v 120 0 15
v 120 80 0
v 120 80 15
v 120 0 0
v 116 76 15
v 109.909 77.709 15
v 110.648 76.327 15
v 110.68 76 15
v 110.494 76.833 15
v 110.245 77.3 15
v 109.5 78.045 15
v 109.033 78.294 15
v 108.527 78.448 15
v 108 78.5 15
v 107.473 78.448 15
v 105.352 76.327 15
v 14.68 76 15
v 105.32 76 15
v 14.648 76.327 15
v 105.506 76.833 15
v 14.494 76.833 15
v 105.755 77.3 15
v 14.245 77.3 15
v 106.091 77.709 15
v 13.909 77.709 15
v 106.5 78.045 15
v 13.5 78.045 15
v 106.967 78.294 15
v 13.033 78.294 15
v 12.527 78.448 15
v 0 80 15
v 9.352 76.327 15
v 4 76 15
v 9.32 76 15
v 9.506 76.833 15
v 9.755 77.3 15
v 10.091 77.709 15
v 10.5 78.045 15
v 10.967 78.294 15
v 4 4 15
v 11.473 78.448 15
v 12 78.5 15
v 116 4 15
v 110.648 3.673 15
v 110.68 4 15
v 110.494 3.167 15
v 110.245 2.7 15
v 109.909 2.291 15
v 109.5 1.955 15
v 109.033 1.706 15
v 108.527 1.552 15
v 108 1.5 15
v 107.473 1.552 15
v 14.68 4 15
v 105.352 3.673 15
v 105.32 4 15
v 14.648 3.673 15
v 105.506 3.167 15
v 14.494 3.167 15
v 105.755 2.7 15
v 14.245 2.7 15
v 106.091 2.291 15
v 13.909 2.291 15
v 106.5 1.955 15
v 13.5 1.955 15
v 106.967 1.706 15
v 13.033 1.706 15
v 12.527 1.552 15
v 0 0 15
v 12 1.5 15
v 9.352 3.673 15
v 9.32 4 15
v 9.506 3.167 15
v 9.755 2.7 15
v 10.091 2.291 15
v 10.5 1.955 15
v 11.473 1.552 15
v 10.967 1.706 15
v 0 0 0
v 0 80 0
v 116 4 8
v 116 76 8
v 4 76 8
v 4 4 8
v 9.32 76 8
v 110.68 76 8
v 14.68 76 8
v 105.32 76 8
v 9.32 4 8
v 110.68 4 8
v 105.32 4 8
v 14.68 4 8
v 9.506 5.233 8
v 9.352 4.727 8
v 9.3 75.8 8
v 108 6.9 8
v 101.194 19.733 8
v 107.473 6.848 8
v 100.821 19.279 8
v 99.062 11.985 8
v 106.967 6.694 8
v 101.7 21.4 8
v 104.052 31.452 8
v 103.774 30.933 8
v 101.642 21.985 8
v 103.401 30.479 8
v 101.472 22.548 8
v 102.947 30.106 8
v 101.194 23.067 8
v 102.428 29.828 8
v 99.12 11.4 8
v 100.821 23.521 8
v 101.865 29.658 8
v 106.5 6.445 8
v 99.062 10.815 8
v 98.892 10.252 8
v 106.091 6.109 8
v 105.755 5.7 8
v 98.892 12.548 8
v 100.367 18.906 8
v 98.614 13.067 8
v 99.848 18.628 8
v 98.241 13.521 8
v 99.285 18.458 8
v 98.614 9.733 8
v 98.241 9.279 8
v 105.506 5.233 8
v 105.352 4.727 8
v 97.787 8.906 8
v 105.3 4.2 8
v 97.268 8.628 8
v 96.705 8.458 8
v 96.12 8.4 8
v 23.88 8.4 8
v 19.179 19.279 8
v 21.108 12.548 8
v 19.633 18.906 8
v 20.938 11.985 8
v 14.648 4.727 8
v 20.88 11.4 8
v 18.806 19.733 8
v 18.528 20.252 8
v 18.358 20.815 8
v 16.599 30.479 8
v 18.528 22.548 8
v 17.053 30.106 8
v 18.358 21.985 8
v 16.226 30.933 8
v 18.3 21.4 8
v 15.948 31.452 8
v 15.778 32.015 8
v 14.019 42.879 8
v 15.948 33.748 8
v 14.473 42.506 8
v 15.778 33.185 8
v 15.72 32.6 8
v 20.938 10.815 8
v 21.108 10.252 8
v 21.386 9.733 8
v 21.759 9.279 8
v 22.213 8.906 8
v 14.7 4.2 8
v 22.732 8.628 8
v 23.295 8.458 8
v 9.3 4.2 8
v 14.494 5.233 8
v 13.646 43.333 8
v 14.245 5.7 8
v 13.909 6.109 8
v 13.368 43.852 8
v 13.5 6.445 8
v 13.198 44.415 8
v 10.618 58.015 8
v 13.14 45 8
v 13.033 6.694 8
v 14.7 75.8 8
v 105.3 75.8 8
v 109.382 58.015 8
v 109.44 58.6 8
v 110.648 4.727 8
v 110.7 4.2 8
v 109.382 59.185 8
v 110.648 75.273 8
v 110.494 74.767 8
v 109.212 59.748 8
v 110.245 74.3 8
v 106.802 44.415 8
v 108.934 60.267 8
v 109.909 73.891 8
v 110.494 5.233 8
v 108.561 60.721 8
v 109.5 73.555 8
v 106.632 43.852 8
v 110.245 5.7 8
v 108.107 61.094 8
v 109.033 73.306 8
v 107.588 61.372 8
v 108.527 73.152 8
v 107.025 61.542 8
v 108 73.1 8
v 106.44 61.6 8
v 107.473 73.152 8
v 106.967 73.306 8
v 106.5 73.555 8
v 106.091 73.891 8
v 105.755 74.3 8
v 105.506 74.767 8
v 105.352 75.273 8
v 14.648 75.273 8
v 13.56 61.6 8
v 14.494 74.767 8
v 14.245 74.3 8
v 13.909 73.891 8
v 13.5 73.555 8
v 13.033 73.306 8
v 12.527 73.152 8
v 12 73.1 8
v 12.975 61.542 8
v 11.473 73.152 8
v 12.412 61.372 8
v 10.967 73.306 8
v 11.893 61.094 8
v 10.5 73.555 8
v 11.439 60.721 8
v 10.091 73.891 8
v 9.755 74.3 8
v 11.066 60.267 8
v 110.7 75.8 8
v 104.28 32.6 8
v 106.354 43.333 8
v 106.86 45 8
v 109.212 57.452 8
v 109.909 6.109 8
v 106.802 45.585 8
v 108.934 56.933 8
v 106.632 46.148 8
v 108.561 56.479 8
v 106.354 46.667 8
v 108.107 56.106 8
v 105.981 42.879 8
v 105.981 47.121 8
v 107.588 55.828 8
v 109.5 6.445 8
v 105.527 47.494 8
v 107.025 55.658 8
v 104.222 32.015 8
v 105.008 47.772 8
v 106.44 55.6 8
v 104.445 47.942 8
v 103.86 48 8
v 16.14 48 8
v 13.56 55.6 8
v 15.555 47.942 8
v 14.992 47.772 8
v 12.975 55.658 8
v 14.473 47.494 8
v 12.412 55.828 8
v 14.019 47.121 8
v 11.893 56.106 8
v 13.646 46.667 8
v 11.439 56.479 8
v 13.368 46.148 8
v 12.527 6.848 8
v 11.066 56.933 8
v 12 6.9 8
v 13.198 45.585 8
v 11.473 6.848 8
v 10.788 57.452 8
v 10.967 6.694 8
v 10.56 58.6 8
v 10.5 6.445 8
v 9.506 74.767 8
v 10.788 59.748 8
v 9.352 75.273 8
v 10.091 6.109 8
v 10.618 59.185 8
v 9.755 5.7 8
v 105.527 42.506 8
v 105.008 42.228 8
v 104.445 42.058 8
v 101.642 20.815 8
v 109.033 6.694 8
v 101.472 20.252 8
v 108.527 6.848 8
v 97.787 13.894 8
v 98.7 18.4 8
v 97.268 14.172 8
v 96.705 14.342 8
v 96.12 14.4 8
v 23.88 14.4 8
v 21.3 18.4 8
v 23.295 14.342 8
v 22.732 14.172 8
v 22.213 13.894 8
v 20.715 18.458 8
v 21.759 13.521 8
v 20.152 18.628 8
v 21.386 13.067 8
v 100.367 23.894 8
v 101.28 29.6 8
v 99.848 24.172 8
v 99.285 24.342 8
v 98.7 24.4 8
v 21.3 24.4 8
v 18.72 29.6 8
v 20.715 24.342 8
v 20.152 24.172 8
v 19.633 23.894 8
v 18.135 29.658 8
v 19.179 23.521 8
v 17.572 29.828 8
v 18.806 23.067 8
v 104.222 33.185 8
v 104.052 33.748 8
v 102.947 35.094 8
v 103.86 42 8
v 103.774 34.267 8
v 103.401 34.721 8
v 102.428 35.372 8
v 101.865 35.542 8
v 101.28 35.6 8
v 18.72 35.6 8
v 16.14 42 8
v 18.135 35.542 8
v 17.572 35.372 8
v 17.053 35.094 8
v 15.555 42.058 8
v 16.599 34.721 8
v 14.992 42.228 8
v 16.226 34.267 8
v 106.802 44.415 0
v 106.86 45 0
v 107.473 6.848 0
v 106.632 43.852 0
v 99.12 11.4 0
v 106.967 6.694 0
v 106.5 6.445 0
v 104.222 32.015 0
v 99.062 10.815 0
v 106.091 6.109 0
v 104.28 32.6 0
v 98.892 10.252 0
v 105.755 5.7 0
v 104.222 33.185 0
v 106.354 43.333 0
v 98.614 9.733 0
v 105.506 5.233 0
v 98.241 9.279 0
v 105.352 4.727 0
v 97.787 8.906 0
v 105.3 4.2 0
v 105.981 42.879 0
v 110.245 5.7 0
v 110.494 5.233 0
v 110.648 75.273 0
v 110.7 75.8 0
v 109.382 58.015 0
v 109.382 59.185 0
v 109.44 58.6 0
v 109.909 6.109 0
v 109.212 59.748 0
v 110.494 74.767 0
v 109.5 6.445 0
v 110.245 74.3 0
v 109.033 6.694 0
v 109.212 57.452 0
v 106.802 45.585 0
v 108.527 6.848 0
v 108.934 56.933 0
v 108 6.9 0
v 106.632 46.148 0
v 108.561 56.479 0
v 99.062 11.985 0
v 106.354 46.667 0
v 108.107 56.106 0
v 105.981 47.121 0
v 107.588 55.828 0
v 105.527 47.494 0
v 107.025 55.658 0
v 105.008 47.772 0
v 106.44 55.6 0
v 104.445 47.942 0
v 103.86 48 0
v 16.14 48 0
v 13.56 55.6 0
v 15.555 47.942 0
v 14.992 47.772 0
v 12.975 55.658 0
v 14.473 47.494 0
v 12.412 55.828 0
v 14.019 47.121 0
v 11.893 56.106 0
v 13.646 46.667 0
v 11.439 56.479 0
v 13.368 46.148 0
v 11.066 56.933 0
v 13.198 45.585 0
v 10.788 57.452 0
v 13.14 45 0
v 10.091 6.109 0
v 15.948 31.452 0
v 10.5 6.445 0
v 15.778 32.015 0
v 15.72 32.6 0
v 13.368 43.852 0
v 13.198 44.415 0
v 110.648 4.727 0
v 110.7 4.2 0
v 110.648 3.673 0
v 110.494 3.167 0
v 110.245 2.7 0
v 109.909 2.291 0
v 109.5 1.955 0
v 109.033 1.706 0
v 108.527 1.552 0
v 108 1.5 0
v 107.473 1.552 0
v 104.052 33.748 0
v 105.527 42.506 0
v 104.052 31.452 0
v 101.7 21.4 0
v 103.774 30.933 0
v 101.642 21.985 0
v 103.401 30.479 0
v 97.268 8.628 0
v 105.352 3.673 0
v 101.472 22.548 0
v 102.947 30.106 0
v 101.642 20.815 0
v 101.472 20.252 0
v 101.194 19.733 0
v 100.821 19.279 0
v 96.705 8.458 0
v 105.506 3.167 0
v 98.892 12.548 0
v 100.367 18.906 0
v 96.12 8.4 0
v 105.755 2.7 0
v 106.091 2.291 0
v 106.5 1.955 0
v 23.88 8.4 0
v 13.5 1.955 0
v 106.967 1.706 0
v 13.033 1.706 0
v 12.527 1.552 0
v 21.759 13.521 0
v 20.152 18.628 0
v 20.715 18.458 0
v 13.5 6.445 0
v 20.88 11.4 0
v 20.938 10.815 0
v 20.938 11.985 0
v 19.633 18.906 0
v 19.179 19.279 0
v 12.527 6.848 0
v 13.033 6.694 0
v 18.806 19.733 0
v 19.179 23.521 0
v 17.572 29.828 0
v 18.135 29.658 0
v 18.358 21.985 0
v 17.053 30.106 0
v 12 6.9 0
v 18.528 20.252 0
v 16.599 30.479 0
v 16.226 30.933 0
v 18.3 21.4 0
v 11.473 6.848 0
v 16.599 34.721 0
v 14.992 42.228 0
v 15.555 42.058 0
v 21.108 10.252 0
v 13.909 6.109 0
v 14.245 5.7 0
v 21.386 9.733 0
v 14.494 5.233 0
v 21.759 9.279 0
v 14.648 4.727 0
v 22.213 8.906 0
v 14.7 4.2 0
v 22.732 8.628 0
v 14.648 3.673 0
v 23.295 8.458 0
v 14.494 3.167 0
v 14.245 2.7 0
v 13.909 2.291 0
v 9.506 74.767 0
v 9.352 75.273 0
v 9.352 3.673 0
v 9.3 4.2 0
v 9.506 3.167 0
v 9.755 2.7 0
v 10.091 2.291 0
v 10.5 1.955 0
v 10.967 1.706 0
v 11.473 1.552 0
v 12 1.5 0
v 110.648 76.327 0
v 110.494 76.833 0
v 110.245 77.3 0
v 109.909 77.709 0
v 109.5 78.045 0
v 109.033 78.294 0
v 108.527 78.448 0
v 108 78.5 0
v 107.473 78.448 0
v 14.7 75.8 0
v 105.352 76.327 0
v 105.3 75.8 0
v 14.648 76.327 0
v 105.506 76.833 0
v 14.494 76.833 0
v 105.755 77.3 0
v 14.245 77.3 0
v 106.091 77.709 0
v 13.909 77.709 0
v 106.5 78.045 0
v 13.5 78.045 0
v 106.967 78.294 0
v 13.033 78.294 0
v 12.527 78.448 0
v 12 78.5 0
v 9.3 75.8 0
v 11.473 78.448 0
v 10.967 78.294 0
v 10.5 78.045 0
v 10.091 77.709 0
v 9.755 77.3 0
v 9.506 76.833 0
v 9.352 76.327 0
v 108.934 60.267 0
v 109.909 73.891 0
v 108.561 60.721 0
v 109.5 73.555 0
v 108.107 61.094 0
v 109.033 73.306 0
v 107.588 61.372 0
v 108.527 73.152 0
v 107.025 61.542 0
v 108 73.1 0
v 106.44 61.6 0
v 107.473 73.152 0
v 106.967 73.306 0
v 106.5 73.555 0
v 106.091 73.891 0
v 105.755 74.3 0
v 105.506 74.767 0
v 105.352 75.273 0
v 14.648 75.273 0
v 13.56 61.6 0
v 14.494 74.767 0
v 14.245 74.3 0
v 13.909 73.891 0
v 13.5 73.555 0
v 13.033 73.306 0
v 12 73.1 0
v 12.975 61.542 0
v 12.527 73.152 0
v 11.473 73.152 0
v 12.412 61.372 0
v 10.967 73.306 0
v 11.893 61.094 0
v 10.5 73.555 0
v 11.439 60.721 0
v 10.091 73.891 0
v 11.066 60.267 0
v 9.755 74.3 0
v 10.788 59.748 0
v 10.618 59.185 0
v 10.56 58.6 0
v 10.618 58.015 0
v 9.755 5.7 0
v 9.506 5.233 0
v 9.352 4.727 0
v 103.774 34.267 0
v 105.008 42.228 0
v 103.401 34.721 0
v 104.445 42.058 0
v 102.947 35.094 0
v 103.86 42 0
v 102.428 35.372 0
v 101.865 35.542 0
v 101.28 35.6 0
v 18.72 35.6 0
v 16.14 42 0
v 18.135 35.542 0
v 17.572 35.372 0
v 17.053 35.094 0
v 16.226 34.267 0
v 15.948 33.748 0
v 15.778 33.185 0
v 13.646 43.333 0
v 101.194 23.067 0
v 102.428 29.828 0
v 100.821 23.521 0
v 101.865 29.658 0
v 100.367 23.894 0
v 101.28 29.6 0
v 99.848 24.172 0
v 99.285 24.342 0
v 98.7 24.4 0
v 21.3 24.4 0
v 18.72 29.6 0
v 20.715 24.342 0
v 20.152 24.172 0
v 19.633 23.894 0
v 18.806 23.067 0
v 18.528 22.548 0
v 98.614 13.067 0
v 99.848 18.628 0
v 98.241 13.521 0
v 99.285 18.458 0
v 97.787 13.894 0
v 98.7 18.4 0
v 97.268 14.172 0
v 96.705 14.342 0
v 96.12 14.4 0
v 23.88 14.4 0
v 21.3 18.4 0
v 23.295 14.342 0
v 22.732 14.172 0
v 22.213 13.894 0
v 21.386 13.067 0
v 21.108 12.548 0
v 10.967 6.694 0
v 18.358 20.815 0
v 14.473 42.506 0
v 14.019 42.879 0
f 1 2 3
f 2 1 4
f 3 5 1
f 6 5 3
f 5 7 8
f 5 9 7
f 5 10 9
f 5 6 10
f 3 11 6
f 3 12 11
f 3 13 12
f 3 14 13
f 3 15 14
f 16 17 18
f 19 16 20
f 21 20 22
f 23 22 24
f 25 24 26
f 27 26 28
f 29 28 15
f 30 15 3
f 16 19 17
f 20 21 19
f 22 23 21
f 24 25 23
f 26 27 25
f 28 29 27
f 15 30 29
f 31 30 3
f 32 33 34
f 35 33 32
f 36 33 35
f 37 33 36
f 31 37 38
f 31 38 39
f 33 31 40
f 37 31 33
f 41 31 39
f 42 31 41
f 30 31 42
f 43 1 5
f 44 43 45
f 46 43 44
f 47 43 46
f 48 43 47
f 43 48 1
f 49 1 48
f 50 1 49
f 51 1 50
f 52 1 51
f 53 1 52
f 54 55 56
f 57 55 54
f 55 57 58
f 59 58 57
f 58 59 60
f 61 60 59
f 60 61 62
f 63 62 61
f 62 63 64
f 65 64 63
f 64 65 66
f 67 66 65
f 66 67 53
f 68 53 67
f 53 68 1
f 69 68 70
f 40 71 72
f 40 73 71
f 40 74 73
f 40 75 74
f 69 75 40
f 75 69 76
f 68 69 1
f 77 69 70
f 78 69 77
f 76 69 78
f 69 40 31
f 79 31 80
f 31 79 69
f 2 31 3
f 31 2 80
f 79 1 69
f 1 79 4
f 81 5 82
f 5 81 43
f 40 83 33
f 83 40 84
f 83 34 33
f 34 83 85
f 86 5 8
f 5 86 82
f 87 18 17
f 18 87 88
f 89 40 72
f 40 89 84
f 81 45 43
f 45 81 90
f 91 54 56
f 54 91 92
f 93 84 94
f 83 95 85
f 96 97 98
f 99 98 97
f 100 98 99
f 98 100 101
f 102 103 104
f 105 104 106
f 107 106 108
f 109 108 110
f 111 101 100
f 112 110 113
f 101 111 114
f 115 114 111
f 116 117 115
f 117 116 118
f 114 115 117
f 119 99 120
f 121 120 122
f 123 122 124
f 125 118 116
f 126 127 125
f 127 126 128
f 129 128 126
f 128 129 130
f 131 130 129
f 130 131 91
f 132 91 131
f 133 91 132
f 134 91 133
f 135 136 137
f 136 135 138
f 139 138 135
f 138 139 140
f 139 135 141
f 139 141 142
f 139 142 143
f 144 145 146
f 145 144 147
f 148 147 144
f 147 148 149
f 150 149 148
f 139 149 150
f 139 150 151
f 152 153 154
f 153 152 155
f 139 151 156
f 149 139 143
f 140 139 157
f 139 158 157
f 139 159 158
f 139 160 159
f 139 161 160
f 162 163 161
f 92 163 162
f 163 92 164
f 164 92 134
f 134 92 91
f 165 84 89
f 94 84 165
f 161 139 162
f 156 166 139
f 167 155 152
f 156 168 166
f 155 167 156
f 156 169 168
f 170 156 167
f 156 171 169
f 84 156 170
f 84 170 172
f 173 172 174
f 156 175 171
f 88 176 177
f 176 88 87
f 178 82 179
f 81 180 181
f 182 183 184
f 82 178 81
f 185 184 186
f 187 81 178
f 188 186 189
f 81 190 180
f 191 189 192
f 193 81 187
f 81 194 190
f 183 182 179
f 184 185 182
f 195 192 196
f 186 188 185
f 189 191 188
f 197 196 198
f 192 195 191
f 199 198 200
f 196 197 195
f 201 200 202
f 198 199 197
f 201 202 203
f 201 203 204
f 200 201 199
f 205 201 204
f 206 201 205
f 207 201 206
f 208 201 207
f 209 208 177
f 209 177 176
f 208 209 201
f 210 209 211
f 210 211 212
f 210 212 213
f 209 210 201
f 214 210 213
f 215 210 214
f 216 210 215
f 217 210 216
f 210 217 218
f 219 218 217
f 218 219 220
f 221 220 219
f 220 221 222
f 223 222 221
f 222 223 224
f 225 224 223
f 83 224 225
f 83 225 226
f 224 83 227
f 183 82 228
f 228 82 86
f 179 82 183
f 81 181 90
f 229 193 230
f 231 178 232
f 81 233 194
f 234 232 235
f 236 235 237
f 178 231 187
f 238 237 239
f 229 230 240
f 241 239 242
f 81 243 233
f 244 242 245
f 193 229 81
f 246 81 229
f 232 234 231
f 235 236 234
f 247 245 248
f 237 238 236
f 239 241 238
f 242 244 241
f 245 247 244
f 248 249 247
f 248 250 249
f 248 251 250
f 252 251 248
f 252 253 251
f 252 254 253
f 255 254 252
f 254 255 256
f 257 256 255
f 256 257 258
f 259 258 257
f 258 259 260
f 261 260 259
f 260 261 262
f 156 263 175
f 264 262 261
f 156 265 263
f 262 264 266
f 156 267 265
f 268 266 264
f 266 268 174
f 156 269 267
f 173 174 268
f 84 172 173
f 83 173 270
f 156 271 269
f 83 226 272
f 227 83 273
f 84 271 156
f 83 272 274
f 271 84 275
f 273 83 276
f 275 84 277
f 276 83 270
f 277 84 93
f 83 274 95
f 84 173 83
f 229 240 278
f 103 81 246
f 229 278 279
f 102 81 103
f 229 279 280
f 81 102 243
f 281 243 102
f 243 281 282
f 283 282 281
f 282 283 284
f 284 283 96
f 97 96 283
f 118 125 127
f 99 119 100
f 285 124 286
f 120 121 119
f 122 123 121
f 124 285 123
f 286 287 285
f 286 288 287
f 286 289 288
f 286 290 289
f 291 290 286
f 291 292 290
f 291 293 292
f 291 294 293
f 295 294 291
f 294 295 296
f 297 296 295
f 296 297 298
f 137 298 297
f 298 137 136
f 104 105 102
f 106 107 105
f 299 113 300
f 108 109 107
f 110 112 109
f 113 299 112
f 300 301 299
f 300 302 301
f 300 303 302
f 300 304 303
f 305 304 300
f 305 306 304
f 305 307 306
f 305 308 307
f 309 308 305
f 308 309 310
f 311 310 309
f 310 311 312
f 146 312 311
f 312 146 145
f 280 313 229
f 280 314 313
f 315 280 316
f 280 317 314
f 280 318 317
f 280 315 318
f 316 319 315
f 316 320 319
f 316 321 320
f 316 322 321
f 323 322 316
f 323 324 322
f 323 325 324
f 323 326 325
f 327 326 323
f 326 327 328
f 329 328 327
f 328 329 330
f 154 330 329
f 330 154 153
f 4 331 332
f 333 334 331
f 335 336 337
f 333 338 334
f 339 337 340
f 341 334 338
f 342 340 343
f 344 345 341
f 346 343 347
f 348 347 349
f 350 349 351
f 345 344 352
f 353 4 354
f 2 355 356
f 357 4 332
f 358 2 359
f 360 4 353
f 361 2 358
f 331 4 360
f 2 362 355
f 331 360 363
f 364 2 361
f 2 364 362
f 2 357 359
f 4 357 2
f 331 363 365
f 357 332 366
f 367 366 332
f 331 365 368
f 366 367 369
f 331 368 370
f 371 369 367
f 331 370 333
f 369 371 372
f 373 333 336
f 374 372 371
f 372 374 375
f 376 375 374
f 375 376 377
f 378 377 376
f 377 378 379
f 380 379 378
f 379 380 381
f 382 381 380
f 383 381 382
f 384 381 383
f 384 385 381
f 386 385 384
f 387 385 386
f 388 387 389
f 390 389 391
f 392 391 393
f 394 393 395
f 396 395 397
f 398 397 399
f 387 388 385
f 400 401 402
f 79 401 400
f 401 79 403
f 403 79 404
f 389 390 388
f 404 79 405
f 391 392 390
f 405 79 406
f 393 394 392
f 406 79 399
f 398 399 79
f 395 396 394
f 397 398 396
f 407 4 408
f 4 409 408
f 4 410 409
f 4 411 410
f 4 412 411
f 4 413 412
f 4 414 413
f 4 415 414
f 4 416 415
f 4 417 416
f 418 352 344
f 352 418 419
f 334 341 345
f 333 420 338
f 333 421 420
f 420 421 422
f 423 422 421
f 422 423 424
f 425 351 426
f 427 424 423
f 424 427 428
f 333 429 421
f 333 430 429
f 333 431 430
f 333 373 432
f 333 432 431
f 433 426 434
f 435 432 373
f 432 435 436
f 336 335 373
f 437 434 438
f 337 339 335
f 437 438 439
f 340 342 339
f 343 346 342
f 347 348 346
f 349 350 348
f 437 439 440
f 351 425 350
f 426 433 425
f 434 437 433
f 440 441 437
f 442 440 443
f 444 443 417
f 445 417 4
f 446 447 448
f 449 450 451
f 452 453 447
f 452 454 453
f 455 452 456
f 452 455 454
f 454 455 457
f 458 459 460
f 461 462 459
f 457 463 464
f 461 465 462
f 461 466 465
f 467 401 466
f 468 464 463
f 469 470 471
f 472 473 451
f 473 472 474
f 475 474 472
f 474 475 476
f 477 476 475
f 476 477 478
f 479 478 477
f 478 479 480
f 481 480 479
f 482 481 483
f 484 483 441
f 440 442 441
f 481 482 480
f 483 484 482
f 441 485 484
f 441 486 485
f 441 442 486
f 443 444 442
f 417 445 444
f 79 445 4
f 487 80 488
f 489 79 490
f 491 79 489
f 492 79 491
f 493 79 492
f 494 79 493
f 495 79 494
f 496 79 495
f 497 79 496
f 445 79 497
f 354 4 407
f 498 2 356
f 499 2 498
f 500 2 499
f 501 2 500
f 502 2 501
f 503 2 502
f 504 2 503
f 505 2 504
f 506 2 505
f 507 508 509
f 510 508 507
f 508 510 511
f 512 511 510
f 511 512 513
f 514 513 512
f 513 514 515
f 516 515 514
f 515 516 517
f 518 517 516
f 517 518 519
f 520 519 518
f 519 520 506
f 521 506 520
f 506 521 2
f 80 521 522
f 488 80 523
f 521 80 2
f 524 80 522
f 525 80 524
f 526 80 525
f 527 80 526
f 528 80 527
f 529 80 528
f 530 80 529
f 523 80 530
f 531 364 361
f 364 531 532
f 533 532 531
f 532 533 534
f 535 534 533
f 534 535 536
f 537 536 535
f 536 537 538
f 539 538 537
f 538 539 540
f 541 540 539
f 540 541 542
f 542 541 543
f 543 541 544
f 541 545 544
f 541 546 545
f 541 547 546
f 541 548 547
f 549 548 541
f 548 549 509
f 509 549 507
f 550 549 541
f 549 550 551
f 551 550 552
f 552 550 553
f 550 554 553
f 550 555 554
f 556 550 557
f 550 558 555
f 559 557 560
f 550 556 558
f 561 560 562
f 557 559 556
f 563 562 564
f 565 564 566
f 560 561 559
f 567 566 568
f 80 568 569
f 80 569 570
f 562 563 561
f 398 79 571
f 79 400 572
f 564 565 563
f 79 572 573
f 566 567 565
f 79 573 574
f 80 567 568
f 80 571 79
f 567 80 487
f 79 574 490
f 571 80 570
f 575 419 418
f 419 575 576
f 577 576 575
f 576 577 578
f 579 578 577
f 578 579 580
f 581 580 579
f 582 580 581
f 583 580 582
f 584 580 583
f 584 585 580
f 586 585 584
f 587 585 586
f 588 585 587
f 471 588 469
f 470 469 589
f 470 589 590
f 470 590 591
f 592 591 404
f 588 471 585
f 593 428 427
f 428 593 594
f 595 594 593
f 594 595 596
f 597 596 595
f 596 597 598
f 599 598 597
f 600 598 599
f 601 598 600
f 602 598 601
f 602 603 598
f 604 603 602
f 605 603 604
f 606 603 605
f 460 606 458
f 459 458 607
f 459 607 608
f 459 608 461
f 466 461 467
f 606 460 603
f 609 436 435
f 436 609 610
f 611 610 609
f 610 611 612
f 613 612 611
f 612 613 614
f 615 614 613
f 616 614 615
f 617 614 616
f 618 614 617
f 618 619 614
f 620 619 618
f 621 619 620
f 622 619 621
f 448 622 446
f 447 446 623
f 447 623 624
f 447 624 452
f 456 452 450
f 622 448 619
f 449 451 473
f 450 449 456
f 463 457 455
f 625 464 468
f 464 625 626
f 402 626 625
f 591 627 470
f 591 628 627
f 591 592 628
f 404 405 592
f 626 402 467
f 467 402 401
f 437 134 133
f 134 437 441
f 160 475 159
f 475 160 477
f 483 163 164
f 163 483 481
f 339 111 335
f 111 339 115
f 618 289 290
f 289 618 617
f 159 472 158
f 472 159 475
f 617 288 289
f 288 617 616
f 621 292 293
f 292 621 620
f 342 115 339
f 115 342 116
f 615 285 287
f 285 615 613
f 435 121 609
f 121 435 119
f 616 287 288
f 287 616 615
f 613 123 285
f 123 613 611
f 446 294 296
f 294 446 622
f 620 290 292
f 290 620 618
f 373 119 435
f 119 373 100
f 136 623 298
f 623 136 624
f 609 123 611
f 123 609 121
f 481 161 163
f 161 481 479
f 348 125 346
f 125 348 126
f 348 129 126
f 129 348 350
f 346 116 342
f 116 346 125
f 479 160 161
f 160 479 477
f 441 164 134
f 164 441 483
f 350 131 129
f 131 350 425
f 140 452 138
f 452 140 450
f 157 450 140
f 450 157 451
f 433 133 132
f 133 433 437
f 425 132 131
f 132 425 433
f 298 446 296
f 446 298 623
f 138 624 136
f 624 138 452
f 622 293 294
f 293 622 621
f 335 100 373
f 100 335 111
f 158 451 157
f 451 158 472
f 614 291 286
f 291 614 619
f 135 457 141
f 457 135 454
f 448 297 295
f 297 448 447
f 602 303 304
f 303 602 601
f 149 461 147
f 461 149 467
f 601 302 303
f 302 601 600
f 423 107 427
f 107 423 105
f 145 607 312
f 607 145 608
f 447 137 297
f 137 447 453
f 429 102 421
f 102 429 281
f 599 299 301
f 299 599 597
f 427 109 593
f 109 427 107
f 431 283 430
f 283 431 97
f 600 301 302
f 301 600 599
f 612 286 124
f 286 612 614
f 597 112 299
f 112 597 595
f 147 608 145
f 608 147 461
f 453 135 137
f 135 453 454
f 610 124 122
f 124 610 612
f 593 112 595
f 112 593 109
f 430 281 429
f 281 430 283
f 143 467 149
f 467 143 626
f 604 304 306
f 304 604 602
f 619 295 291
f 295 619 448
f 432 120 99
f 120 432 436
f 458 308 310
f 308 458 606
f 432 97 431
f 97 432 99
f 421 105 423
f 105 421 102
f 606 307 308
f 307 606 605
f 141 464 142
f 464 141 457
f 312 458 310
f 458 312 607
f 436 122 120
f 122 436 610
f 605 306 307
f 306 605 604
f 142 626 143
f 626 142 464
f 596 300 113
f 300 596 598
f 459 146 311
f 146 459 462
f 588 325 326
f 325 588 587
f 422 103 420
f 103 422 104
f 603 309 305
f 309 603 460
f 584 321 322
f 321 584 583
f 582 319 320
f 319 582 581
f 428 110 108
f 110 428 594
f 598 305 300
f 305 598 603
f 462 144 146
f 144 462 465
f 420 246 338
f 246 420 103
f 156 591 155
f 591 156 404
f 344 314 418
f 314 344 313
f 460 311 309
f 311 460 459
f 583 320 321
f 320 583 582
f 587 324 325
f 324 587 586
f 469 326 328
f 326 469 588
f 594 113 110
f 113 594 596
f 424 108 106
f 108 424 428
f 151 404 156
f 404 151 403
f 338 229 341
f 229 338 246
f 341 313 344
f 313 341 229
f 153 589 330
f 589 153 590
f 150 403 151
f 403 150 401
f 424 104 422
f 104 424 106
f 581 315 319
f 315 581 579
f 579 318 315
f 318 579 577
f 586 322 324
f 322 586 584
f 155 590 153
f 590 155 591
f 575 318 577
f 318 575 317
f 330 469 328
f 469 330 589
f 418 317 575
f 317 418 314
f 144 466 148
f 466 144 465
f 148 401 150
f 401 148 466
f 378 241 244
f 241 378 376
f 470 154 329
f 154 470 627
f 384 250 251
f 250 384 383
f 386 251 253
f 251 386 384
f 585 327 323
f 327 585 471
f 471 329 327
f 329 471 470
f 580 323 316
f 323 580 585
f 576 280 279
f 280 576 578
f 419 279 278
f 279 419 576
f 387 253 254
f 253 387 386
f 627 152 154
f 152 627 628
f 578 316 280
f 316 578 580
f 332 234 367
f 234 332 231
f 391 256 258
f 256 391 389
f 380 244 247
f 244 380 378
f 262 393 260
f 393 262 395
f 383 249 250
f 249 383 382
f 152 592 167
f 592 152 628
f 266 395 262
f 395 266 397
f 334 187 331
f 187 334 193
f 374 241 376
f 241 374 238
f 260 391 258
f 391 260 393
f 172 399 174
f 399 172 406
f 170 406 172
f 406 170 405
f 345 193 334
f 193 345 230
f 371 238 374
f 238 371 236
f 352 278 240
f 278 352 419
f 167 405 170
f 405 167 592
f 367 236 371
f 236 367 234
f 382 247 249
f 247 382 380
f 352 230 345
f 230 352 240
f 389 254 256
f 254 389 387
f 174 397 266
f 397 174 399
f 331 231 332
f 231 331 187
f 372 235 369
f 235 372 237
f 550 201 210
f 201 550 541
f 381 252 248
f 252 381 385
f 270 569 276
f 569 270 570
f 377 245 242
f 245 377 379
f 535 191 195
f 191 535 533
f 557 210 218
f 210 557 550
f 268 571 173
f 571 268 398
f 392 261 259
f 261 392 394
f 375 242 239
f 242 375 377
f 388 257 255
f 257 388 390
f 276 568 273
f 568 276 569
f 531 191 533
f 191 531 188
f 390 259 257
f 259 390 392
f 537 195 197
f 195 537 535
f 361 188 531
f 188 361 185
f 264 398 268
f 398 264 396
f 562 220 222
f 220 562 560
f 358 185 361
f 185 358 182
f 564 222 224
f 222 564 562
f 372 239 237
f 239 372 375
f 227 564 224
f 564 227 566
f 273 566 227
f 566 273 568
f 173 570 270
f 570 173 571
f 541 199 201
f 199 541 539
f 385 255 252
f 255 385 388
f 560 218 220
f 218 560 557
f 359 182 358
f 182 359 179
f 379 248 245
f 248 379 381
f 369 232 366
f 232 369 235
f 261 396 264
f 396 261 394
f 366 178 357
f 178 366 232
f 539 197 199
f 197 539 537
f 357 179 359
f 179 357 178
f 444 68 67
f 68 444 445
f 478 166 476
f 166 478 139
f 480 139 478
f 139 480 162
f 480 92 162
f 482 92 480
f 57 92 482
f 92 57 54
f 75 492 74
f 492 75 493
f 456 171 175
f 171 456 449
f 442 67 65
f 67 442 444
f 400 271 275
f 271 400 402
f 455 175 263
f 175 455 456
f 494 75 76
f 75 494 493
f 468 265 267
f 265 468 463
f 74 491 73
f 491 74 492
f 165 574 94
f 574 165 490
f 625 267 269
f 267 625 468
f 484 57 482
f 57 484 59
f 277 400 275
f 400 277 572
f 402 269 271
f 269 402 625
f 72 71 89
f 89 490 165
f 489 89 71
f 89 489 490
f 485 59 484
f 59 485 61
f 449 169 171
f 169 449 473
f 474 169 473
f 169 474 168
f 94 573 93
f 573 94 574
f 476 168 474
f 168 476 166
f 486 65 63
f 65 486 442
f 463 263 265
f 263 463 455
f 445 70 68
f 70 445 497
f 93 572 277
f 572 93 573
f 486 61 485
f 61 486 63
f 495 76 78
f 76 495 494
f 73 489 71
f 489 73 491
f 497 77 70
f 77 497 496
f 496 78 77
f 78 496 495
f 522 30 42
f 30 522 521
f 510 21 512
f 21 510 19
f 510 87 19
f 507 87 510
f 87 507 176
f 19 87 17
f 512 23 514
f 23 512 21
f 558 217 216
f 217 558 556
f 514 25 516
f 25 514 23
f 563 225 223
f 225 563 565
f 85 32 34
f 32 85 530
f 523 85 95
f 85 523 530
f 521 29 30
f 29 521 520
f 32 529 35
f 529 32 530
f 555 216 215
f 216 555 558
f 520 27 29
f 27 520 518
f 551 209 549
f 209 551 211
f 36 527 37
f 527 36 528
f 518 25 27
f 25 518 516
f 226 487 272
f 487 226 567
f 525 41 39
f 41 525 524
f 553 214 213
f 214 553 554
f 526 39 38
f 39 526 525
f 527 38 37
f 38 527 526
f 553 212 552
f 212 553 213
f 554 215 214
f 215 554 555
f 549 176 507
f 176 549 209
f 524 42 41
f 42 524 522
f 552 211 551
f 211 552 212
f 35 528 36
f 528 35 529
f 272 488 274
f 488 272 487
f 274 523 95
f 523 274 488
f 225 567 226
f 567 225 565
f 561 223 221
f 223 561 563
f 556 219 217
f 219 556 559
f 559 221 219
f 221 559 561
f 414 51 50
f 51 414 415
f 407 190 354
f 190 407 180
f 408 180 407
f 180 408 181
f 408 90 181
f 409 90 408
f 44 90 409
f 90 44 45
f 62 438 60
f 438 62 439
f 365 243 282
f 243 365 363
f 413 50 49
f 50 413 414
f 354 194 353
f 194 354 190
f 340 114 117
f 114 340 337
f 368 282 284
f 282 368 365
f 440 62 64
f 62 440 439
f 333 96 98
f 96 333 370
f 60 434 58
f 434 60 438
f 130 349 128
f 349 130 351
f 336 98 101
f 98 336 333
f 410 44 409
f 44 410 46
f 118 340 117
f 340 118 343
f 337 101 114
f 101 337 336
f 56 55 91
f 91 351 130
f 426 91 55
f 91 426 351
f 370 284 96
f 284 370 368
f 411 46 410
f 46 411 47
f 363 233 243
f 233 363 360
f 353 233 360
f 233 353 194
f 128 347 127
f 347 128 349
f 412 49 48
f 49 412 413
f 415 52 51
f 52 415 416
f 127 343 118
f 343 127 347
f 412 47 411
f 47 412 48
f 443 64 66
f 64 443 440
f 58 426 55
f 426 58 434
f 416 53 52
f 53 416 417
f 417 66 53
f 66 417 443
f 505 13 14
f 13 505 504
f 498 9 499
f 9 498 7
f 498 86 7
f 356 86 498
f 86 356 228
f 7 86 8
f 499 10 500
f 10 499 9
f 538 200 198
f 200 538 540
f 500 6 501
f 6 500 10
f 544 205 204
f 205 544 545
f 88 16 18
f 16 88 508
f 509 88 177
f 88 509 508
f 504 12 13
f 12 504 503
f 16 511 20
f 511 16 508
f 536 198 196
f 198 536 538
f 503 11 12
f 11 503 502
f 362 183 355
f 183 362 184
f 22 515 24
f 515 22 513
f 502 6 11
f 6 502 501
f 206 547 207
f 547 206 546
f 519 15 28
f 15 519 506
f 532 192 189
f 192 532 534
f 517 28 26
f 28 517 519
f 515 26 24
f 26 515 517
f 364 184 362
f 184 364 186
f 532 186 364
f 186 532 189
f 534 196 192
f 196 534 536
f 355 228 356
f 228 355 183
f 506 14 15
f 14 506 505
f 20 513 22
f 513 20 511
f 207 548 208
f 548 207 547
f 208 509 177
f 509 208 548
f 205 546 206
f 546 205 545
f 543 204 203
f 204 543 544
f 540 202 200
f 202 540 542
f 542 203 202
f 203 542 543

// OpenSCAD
$fn = 32;

// ----------------------------------------------------------------------
// Slotted panel: 120 x 80 mm, 5 рядов of slots
// ----------------------------------------------------------------------

// --- parameters (mm) ---
panel_w = 120;            // panel width
panel_d = 80;             // panel depth
thick = 8;                // panel thickness
slot_w = 6;               // slot width
pitch0 = 10;              // first row pitch
pitch_step = 1.2;         // pitch increase per row
margin = 8.4;             // margin around the slot field
rows = 5;                 // number of slot rows
mount_d = 5.4;            // mounting holes
mount_x = 48;             // mounting hole offset
rim_h = 15;               // rim height
rim_t = 4;                // rim wall thickness

difference() {
  union() {
    cube([panel_w, panel_d, thick]);
    translate([0, 0, thick - 1]) difference() {
      cube([panel_w, panel_d, rim_h - thick + 1]);
      translate([rim_t, rim_t, -2.5]) cube([panel_w - 2 * rim_t, panel_d - 2 * rim_t, rim_h - thick + 6]);
    }
  }
  /* slot rows: stadium shaped cutters, 2.5 mm clear of both faces */
  /* row 0: pitch 10, length 72.24 */
  hull() {
    translate([23.88, 11.4, -2.5]) cylinder(h = thick + 5, d = slot_w);
    translate([96.12, 11.4, -2.5]) cylinder(h = thick + 5, d = slot_w);
  }
  /* row 1: pitch 11.2, length 77.4 */
  hull() {
    translate([21.3, 21.4, -2.5]) cylinder(h = thick + 5, d = slot_w);
    translate([98.7, 21.4, -2.5]) cylinder(h = thick + 5, d = slot_w);
  }
  /* row 2: pitch 12.4, length 82.56 */
  hull() {
    translate([18.72, 32.6, -2.5]) cylinder(h = thick + 5, d = slot_w);
    translate([101.28, 32.6, -2.5]) cylinder(h = thick + 5, d = slot_w);
  }
  /* row 3: pitch 13.6, length 87.72 */
  hull() {
    translate([16.14, 45, -2.5]) cylinder(h = thick + 5, d = slot_w);
    translate([103.86, 45, -2.5]) cylinder(h = thick + 5, d = slot_w);
  }
  /* row 4: pitch 14.8, length 92.88 */
  hull() {
    translate([13.56, 58.6, -2.5]) cylinder(h = thick + 5, d = slot_w);
    translate([106.44, 58.6, -2.5]) cylinder(h = thick + 5, d = slot_w);
  }
  translate([12, 4.2, -2.5]) cylinder(h = 20, d = mount_d);
  translate([12, 75.8, -2.5]) cylinder(h = 20, d = mount_d);
  translate([108, 4.2, -2.5]) cylinder(h = 20, d = mount_d);
  translate([108, 75.8, -2.5]) cylinder(h = 20, d = mount_d);
}
